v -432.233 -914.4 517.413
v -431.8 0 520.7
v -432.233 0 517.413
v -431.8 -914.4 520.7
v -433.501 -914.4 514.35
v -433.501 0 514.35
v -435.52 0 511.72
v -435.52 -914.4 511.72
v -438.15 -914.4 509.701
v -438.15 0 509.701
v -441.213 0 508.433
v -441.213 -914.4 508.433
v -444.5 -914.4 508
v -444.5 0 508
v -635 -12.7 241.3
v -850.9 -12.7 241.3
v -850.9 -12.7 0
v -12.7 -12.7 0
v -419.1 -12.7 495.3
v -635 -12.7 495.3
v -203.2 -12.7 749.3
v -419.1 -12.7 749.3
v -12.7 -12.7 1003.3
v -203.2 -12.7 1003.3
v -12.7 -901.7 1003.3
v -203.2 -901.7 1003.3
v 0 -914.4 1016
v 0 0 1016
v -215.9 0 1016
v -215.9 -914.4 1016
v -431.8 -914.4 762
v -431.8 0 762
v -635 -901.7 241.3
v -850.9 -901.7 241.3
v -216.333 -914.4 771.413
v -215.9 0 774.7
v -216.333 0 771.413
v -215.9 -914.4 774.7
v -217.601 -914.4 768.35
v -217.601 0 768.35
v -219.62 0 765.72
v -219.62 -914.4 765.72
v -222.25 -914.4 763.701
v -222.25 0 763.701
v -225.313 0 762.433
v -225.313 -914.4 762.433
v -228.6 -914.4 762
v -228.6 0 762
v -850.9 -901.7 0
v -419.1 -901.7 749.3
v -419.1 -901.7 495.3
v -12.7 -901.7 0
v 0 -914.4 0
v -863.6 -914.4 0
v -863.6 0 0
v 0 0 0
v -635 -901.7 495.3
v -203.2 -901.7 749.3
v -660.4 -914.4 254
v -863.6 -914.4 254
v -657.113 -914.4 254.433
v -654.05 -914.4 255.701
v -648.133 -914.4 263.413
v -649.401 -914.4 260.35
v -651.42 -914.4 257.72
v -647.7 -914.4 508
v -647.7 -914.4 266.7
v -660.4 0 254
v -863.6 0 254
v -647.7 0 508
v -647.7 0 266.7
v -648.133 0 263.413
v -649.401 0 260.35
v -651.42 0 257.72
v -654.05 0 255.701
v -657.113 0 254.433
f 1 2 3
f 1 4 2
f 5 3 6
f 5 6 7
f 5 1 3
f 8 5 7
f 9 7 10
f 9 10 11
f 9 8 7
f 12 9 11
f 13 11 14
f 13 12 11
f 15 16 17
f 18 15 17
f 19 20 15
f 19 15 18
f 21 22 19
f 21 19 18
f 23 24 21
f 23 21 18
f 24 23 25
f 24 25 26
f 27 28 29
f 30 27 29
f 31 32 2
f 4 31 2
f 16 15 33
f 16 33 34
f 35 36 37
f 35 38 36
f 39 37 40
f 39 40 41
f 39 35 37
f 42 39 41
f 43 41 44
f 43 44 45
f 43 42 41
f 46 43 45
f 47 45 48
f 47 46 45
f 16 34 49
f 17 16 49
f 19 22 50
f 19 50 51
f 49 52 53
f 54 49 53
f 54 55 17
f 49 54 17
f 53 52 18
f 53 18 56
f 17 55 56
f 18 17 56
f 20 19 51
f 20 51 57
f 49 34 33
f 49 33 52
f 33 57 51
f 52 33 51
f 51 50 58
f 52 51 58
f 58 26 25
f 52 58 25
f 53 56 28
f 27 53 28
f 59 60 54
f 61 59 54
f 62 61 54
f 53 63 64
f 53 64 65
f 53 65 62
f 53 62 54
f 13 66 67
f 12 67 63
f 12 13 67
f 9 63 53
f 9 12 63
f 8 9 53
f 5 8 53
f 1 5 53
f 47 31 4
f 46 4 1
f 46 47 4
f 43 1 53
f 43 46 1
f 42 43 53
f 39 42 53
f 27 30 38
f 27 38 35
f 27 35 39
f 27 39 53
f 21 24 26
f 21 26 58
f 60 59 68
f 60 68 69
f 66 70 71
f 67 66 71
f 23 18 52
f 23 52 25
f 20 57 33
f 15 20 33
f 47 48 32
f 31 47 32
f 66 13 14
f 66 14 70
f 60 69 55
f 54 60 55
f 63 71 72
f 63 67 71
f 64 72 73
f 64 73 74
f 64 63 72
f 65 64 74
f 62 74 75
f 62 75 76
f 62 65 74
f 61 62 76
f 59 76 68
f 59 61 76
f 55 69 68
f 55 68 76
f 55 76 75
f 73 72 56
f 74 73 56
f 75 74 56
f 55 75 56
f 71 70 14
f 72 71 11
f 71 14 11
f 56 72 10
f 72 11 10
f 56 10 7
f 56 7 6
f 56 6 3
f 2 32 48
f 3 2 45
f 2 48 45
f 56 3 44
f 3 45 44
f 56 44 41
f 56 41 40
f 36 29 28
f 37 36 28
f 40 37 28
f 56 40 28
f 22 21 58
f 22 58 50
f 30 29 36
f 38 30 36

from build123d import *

# Parameters (mm, degrees)
F1_DEPTH = 914.4
F2_T     = -12.7
F3_R     = 12.7


with BuildPart() as f1:
    # F0 (on Front) → F1 (new body)
    with BuildSketch(Plane.XZ):
        Polygon((-863.6, 0), (0, 0), (0, 1016), (-215.9, 1016), (-215.9, 762), (-431.8, 762), (-431.8, 508), (-647.7, 508), (-647.7, 254), (-863.6, 254), align=None)
    extrude(amount=F1_DEPTH)

    # F2
    f2_openings = [f1.faces().sort_by_distance(p)[0] for p in [
        (-431.8, -457.2, 0),
    ]]
    offset(amount=F2_T, openings=f2_openings, kind=Kind.INTERSECTION)

    # F3
    f3_edges = [f1.edges().sort_by_distance(p)[0] for p in [
        (-647.7, -457.2, 254),
        (-431.8, -457.2, 508),
        (-215.9, -457.2, 762),
    ]]
    fillet(f3_edges, radius=F3_R)


solid = f1.part
